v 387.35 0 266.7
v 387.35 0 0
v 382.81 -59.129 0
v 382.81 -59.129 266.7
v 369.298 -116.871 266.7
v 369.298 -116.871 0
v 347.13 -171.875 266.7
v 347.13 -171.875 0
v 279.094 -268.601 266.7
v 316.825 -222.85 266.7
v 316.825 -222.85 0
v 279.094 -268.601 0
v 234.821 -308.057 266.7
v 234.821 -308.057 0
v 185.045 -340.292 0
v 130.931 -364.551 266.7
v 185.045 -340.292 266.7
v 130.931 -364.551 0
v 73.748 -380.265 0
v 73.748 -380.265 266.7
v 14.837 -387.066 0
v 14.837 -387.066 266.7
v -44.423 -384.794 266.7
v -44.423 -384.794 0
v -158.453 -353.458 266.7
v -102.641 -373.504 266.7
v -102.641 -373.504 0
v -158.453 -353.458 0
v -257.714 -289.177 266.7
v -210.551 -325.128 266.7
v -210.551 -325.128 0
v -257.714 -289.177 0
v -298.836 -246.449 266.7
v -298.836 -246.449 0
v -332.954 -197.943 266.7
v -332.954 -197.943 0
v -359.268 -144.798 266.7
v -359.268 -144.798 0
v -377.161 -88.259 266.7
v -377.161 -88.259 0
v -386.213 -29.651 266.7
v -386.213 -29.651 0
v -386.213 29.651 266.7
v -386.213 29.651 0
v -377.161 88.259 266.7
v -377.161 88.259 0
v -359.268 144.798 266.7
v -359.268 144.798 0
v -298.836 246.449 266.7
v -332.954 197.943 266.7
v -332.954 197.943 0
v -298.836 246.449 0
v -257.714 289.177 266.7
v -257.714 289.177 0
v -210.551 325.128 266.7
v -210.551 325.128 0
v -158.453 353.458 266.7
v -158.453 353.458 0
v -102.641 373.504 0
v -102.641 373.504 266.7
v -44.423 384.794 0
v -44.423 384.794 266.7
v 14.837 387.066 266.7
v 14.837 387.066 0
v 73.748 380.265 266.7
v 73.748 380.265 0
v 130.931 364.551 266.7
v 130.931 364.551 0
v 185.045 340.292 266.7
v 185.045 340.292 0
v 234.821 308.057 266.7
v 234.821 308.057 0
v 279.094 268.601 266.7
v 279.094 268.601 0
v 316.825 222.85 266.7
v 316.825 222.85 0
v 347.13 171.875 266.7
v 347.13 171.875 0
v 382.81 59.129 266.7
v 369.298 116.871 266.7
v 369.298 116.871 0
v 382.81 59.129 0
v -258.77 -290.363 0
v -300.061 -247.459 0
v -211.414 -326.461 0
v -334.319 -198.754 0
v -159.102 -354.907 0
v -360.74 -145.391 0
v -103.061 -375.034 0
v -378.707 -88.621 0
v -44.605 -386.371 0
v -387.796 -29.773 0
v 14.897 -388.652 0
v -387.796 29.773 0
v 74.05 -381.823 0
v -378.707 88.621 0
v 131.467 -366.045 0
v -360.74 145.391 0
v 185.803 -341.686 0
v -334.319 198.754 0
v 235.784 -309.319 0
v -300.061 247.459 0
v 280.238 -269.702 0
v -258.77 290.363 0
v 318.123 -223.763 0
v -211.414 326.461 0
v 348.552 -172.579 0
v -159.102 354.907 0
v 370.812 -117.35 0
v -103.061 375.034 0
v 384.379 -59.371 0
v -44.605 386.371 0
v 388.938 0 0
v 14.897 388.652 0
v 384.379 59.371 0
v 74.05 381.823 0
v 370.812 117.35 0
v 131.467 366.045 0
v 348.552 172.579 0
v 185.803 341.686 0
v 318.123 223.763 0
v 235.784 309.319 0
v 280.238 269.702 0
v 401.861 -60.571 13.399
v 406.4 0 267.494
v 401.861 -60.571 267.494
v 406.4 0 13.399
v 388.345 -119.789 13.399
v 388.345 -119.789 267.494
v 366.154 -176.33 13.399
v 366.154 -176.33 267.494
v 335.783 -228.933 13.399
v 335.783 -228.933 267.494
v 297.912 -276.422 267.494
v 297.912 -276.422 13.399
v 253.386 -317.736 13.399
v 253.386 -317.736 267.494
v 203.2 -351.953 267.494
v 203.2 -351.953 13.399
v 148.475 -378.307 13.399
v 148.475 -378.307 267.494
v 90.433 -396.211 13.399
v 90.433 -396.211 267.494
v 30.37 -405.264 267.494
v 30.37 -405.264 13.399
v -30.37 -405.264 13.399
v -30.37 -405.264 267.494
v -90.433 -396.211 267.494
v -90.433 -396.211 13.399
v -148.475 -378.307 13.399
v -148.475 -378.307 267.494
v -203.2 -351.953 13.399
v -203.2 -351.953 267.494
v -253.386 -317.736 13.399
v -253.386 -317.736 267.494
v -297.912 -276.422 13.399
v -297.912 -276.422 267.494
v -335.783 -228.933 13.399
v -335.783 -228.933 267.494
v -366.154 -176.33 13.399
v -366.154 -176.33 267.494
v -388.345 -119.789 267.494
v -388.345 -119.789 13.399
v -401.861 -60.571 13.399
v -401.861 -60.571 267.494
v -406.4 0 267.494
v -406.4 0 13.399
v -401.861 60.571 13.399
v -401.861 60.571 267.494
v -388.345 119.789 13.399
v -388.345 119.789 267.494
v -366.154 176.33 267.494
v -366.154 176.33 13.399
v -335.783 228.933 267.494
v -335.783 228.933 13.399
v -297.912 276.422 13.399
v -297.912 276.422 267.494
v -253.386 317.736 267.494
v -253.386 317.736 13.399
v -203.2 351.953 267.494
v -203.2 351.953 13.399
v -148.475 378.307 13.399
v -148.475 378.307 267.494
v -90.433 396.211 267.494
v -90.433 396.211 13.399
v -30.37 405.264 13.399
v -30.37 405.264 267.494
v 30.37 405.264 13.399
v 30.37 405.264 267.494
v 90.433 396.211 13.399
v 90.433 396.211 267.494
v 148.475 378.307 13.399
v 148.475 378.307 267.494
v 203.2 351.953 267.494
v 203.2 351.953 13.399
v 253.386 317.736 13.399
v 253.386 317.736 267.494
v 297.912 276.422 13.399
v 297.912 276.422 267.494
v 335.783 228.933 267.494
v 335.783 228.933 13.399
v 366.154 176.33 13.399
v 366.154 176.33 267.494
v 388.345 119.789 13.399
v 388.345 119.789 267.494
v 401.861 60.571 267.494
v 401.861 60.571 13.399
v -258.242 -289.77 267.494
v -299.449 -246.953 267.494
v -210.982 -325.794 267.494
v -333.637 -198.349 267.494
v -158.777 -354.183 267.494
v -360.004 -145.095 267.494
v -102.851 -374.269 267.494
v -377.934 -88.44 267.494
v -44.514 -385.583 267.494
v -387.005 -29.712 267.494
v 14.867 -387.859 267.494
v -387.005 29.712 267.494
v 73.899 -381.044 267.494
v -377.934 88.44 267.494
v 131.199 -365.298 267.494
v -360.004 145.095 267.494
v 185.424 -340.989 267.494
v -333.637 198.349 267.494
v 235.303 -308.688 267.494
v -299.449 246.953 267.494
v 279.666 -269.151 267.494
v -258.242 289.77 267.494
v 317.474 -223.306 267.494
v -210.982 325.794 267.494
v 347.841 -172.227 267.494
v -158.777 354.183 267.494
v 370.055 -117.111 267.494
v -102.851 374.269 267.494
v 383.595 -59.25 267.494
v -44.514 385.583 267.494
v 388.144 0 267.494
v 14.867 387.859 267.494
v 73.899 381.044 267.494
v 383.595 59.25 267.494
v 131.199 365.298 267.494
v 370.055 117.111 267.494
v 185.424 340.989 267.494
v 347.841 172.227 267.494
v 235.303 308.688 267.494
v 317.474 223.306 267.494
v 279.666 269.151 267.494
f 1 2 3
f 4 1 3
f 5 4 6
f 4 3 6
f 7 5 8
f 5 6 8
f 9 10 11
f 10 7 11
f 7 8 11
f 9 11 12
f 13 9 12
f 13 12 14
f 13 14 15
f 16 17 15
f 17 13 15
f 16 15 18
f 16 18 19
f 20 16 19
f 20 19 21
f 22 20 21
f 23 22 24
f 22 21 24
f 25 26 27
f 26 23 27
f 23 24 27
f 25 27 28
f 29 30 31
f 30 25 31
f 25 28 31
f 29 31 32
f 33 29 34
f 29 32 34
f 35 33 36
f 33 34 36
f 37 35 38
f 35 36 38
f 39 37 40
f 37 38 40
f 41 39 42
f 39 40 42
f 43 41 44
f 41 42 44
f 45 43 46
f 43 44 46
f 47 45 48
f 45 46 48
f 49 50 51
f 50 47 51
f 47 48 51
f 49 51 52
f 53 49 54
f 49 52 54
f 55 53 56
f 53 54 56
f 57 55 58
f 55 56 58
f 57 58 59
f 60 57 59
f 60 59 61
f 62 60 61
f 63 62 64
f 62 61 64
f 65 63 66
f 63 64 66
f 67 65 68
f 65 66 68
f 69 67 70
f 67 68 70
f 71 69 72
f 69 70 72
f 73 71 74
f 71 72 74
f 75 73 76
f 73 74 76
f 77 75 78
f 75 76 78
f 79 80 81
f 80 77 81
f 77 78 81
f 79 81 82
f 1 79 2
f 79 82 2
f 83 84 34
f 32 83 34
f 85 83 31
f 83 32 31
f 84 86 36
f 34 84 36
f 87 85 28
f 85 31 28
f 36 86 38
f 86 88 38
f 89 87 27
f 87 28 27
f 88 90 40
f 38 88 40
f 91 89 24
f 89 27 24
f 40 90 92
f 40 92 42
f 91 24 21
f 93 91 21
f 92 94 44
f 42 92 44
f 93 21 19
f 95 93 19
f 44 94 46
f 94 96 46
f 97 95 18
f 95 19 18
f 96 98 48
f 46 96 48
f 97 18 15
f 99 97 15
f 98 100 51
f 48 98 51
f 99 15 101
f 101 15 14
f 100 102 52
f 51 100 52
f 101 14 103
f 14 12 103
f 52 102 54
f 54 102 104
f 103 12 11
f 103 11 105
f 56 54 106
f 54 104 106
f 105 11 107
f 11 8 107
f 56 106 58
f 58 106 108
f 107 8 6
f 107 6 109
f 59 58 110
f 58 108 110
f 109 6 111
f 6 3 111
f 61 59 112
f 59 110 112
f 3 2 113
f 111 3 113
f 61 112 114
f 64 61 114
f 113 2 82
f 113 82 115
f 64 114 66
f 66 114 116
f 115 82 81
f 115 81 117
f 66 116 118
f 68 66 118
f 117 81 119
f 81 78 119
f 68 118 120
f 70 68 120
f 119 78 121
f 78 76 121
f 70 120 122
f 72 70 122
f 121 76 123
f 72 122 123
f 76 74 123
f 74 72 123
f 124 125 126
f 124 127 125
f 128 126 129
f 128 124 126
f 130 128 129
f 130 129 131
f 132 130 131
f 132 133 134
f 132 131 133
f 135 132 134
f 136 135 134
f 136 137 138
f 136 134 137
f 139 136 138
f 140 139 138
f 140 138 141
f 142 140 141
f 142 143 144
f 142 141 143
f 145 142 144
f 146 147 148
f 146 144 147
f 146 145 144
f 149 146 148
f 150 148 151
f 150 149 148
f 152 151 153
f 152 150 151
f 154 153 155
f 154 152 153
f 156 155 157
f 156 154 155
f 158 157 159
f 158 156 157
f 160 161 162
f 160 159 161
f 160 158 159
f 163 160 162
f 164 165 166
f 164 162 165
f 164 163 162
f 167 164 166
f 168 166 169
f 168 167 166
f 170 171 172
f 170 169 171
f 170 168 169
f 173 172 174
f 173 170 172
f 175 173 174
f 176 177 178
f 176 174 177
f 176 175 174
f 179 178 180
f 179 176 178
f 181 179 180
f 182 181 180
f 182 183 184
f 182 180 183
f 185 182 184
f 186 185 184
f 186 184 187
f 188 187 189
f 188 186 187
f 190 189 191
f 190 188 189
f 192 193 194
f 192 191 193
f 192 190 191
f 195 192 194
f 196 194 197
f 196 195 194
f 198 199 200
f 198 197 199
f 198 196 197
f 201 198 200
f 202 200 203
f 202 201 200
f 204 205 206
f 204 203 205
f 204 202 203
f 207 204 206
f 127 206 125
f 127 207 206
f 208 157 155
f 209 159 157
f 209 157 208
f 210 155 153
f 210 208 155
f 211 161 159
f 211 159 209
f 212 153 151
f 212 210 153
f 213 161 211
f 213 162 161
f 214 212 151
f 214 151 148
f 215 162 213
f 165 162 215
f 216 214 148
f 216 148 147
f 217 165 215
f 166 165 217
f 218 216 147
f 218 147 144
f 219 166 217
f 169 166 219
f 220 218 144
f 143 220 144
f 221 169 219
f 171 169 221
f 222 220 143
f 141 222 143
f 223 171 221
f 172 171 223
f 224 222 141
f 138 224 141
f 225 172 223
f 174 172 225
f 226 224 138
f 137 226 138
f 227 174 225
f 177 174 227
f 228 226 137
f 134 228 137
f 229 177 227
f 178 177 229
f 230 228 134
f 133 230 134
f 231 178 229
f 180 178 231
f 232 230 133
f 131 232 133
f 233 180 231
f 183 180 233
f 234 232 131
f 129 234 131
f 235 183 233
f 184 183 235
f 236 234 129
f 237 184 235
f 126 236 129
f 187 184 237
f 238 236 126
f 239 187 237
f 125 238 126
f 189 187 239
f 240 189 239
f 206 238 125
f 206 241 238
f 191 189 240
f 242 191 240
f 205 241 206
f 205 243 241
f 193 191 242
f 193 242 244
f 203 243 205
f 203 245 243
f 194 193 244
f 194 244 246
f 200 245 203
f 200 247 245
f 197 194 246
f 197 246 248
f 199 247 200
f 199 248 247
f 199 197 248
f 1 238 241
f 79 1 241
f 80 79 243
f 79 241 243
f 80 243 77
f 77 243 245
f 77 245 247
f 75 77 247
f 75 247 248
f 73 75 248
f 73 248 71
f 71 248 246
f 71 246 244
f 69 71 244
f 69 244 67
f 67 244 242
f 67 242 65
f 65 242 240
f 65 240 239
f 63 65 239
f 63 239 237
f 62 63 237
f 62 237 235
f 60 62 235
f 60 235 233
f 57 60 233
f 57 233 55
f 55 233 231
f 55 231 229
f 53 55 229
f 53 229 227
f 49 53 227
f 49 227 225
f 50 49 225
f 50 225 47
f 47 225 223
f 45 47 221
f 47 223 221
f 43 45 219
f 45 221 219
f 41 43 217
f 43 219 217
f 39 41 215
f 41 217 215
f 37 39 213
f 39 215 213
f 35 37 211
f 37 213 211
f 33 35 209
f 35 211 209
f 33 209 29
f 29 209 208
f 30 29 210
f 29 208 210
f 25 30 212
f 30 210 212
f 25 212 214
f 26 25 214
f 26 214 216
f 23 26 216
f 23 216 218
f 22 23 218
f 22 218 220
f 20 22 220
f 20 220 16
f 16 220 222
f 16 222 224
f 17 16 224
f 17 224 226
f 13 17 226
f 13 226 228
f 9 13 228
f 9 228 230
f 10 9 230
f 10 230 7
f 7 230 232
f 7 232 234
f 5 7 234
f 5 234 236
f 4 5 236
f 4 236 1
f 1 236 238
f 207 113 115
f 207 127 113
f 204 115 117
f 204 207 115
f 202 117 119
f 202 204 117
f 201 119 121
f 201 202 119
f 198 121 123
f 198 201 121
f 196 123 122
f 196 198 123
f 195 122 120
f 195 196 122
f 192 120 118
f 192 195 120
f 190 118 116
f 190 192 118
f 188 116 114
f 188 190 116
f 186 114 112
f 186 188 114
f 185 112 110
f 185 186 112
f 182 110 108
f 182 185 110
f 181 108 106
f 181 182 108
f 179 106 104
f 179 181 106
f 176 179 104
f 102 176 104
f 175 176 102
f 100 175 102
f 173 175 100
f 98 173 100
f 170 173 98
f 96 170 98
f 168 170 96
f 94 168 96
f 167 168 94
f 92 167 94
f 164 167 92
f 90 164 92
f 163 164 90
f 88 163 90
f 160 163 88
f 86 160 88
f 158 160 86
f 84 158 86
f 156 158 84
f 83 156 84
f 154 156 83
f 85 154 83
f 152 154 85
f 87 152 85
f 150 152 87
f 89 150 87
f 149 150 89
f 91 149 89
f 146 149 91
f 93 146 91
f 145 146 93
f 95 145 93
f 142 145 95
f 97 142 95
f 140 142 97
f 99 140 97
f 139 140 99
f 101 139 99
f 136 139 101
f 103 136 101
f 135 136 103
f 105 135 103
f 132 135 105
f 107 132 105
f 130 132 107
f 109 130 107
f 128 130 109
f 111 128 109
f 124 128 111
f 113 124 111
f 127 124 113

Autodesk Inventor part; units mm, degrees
ref_plane "YZ Plane" through (0, 0, 0) normal (1, 0, 0) x (0, 1, 0)
ref_plane "XZ Plane" through (0, 0, 0) normal (0, 1, 0) x (-1, 0, 0)
sketch "Sketch1" plane through (0, 0, 0) normal (0, 0, 1) x (1, 0, 0)
  circle A0 centre (0, 0) radius 406.4
  circle A1 centre (0, 0) radius 387.35
  dimension "d0" = 812.8
  dimension "d1" = 774.7
extrude "Extrusion1" add sketch "Sketch1" along normal blind 267.4937
chamfer "Chamfer1" distance 17.4625 angle 37.5 1 edges at (-406.4, 0, 0) measured on face at (-399.72, -9.4497, 0)
ref_plane "Work Plane2" through (0, 0, 235.7438) normal (0, 0, 1) x (1, 0, 0)
ref_plane "Work Plane1" through (0, 0, 216.6938) normal (0, 0, 1) x (1, 0, 0)
split_face "Split1"
split_face "Split2"
chamfer "Chamfer2" distance 0.7937 angle 45 1 edges at (-387.35, 0, 267.4937)
properties part number "A1-19037-100-03 32in pipe" material "Steel, Mild"
